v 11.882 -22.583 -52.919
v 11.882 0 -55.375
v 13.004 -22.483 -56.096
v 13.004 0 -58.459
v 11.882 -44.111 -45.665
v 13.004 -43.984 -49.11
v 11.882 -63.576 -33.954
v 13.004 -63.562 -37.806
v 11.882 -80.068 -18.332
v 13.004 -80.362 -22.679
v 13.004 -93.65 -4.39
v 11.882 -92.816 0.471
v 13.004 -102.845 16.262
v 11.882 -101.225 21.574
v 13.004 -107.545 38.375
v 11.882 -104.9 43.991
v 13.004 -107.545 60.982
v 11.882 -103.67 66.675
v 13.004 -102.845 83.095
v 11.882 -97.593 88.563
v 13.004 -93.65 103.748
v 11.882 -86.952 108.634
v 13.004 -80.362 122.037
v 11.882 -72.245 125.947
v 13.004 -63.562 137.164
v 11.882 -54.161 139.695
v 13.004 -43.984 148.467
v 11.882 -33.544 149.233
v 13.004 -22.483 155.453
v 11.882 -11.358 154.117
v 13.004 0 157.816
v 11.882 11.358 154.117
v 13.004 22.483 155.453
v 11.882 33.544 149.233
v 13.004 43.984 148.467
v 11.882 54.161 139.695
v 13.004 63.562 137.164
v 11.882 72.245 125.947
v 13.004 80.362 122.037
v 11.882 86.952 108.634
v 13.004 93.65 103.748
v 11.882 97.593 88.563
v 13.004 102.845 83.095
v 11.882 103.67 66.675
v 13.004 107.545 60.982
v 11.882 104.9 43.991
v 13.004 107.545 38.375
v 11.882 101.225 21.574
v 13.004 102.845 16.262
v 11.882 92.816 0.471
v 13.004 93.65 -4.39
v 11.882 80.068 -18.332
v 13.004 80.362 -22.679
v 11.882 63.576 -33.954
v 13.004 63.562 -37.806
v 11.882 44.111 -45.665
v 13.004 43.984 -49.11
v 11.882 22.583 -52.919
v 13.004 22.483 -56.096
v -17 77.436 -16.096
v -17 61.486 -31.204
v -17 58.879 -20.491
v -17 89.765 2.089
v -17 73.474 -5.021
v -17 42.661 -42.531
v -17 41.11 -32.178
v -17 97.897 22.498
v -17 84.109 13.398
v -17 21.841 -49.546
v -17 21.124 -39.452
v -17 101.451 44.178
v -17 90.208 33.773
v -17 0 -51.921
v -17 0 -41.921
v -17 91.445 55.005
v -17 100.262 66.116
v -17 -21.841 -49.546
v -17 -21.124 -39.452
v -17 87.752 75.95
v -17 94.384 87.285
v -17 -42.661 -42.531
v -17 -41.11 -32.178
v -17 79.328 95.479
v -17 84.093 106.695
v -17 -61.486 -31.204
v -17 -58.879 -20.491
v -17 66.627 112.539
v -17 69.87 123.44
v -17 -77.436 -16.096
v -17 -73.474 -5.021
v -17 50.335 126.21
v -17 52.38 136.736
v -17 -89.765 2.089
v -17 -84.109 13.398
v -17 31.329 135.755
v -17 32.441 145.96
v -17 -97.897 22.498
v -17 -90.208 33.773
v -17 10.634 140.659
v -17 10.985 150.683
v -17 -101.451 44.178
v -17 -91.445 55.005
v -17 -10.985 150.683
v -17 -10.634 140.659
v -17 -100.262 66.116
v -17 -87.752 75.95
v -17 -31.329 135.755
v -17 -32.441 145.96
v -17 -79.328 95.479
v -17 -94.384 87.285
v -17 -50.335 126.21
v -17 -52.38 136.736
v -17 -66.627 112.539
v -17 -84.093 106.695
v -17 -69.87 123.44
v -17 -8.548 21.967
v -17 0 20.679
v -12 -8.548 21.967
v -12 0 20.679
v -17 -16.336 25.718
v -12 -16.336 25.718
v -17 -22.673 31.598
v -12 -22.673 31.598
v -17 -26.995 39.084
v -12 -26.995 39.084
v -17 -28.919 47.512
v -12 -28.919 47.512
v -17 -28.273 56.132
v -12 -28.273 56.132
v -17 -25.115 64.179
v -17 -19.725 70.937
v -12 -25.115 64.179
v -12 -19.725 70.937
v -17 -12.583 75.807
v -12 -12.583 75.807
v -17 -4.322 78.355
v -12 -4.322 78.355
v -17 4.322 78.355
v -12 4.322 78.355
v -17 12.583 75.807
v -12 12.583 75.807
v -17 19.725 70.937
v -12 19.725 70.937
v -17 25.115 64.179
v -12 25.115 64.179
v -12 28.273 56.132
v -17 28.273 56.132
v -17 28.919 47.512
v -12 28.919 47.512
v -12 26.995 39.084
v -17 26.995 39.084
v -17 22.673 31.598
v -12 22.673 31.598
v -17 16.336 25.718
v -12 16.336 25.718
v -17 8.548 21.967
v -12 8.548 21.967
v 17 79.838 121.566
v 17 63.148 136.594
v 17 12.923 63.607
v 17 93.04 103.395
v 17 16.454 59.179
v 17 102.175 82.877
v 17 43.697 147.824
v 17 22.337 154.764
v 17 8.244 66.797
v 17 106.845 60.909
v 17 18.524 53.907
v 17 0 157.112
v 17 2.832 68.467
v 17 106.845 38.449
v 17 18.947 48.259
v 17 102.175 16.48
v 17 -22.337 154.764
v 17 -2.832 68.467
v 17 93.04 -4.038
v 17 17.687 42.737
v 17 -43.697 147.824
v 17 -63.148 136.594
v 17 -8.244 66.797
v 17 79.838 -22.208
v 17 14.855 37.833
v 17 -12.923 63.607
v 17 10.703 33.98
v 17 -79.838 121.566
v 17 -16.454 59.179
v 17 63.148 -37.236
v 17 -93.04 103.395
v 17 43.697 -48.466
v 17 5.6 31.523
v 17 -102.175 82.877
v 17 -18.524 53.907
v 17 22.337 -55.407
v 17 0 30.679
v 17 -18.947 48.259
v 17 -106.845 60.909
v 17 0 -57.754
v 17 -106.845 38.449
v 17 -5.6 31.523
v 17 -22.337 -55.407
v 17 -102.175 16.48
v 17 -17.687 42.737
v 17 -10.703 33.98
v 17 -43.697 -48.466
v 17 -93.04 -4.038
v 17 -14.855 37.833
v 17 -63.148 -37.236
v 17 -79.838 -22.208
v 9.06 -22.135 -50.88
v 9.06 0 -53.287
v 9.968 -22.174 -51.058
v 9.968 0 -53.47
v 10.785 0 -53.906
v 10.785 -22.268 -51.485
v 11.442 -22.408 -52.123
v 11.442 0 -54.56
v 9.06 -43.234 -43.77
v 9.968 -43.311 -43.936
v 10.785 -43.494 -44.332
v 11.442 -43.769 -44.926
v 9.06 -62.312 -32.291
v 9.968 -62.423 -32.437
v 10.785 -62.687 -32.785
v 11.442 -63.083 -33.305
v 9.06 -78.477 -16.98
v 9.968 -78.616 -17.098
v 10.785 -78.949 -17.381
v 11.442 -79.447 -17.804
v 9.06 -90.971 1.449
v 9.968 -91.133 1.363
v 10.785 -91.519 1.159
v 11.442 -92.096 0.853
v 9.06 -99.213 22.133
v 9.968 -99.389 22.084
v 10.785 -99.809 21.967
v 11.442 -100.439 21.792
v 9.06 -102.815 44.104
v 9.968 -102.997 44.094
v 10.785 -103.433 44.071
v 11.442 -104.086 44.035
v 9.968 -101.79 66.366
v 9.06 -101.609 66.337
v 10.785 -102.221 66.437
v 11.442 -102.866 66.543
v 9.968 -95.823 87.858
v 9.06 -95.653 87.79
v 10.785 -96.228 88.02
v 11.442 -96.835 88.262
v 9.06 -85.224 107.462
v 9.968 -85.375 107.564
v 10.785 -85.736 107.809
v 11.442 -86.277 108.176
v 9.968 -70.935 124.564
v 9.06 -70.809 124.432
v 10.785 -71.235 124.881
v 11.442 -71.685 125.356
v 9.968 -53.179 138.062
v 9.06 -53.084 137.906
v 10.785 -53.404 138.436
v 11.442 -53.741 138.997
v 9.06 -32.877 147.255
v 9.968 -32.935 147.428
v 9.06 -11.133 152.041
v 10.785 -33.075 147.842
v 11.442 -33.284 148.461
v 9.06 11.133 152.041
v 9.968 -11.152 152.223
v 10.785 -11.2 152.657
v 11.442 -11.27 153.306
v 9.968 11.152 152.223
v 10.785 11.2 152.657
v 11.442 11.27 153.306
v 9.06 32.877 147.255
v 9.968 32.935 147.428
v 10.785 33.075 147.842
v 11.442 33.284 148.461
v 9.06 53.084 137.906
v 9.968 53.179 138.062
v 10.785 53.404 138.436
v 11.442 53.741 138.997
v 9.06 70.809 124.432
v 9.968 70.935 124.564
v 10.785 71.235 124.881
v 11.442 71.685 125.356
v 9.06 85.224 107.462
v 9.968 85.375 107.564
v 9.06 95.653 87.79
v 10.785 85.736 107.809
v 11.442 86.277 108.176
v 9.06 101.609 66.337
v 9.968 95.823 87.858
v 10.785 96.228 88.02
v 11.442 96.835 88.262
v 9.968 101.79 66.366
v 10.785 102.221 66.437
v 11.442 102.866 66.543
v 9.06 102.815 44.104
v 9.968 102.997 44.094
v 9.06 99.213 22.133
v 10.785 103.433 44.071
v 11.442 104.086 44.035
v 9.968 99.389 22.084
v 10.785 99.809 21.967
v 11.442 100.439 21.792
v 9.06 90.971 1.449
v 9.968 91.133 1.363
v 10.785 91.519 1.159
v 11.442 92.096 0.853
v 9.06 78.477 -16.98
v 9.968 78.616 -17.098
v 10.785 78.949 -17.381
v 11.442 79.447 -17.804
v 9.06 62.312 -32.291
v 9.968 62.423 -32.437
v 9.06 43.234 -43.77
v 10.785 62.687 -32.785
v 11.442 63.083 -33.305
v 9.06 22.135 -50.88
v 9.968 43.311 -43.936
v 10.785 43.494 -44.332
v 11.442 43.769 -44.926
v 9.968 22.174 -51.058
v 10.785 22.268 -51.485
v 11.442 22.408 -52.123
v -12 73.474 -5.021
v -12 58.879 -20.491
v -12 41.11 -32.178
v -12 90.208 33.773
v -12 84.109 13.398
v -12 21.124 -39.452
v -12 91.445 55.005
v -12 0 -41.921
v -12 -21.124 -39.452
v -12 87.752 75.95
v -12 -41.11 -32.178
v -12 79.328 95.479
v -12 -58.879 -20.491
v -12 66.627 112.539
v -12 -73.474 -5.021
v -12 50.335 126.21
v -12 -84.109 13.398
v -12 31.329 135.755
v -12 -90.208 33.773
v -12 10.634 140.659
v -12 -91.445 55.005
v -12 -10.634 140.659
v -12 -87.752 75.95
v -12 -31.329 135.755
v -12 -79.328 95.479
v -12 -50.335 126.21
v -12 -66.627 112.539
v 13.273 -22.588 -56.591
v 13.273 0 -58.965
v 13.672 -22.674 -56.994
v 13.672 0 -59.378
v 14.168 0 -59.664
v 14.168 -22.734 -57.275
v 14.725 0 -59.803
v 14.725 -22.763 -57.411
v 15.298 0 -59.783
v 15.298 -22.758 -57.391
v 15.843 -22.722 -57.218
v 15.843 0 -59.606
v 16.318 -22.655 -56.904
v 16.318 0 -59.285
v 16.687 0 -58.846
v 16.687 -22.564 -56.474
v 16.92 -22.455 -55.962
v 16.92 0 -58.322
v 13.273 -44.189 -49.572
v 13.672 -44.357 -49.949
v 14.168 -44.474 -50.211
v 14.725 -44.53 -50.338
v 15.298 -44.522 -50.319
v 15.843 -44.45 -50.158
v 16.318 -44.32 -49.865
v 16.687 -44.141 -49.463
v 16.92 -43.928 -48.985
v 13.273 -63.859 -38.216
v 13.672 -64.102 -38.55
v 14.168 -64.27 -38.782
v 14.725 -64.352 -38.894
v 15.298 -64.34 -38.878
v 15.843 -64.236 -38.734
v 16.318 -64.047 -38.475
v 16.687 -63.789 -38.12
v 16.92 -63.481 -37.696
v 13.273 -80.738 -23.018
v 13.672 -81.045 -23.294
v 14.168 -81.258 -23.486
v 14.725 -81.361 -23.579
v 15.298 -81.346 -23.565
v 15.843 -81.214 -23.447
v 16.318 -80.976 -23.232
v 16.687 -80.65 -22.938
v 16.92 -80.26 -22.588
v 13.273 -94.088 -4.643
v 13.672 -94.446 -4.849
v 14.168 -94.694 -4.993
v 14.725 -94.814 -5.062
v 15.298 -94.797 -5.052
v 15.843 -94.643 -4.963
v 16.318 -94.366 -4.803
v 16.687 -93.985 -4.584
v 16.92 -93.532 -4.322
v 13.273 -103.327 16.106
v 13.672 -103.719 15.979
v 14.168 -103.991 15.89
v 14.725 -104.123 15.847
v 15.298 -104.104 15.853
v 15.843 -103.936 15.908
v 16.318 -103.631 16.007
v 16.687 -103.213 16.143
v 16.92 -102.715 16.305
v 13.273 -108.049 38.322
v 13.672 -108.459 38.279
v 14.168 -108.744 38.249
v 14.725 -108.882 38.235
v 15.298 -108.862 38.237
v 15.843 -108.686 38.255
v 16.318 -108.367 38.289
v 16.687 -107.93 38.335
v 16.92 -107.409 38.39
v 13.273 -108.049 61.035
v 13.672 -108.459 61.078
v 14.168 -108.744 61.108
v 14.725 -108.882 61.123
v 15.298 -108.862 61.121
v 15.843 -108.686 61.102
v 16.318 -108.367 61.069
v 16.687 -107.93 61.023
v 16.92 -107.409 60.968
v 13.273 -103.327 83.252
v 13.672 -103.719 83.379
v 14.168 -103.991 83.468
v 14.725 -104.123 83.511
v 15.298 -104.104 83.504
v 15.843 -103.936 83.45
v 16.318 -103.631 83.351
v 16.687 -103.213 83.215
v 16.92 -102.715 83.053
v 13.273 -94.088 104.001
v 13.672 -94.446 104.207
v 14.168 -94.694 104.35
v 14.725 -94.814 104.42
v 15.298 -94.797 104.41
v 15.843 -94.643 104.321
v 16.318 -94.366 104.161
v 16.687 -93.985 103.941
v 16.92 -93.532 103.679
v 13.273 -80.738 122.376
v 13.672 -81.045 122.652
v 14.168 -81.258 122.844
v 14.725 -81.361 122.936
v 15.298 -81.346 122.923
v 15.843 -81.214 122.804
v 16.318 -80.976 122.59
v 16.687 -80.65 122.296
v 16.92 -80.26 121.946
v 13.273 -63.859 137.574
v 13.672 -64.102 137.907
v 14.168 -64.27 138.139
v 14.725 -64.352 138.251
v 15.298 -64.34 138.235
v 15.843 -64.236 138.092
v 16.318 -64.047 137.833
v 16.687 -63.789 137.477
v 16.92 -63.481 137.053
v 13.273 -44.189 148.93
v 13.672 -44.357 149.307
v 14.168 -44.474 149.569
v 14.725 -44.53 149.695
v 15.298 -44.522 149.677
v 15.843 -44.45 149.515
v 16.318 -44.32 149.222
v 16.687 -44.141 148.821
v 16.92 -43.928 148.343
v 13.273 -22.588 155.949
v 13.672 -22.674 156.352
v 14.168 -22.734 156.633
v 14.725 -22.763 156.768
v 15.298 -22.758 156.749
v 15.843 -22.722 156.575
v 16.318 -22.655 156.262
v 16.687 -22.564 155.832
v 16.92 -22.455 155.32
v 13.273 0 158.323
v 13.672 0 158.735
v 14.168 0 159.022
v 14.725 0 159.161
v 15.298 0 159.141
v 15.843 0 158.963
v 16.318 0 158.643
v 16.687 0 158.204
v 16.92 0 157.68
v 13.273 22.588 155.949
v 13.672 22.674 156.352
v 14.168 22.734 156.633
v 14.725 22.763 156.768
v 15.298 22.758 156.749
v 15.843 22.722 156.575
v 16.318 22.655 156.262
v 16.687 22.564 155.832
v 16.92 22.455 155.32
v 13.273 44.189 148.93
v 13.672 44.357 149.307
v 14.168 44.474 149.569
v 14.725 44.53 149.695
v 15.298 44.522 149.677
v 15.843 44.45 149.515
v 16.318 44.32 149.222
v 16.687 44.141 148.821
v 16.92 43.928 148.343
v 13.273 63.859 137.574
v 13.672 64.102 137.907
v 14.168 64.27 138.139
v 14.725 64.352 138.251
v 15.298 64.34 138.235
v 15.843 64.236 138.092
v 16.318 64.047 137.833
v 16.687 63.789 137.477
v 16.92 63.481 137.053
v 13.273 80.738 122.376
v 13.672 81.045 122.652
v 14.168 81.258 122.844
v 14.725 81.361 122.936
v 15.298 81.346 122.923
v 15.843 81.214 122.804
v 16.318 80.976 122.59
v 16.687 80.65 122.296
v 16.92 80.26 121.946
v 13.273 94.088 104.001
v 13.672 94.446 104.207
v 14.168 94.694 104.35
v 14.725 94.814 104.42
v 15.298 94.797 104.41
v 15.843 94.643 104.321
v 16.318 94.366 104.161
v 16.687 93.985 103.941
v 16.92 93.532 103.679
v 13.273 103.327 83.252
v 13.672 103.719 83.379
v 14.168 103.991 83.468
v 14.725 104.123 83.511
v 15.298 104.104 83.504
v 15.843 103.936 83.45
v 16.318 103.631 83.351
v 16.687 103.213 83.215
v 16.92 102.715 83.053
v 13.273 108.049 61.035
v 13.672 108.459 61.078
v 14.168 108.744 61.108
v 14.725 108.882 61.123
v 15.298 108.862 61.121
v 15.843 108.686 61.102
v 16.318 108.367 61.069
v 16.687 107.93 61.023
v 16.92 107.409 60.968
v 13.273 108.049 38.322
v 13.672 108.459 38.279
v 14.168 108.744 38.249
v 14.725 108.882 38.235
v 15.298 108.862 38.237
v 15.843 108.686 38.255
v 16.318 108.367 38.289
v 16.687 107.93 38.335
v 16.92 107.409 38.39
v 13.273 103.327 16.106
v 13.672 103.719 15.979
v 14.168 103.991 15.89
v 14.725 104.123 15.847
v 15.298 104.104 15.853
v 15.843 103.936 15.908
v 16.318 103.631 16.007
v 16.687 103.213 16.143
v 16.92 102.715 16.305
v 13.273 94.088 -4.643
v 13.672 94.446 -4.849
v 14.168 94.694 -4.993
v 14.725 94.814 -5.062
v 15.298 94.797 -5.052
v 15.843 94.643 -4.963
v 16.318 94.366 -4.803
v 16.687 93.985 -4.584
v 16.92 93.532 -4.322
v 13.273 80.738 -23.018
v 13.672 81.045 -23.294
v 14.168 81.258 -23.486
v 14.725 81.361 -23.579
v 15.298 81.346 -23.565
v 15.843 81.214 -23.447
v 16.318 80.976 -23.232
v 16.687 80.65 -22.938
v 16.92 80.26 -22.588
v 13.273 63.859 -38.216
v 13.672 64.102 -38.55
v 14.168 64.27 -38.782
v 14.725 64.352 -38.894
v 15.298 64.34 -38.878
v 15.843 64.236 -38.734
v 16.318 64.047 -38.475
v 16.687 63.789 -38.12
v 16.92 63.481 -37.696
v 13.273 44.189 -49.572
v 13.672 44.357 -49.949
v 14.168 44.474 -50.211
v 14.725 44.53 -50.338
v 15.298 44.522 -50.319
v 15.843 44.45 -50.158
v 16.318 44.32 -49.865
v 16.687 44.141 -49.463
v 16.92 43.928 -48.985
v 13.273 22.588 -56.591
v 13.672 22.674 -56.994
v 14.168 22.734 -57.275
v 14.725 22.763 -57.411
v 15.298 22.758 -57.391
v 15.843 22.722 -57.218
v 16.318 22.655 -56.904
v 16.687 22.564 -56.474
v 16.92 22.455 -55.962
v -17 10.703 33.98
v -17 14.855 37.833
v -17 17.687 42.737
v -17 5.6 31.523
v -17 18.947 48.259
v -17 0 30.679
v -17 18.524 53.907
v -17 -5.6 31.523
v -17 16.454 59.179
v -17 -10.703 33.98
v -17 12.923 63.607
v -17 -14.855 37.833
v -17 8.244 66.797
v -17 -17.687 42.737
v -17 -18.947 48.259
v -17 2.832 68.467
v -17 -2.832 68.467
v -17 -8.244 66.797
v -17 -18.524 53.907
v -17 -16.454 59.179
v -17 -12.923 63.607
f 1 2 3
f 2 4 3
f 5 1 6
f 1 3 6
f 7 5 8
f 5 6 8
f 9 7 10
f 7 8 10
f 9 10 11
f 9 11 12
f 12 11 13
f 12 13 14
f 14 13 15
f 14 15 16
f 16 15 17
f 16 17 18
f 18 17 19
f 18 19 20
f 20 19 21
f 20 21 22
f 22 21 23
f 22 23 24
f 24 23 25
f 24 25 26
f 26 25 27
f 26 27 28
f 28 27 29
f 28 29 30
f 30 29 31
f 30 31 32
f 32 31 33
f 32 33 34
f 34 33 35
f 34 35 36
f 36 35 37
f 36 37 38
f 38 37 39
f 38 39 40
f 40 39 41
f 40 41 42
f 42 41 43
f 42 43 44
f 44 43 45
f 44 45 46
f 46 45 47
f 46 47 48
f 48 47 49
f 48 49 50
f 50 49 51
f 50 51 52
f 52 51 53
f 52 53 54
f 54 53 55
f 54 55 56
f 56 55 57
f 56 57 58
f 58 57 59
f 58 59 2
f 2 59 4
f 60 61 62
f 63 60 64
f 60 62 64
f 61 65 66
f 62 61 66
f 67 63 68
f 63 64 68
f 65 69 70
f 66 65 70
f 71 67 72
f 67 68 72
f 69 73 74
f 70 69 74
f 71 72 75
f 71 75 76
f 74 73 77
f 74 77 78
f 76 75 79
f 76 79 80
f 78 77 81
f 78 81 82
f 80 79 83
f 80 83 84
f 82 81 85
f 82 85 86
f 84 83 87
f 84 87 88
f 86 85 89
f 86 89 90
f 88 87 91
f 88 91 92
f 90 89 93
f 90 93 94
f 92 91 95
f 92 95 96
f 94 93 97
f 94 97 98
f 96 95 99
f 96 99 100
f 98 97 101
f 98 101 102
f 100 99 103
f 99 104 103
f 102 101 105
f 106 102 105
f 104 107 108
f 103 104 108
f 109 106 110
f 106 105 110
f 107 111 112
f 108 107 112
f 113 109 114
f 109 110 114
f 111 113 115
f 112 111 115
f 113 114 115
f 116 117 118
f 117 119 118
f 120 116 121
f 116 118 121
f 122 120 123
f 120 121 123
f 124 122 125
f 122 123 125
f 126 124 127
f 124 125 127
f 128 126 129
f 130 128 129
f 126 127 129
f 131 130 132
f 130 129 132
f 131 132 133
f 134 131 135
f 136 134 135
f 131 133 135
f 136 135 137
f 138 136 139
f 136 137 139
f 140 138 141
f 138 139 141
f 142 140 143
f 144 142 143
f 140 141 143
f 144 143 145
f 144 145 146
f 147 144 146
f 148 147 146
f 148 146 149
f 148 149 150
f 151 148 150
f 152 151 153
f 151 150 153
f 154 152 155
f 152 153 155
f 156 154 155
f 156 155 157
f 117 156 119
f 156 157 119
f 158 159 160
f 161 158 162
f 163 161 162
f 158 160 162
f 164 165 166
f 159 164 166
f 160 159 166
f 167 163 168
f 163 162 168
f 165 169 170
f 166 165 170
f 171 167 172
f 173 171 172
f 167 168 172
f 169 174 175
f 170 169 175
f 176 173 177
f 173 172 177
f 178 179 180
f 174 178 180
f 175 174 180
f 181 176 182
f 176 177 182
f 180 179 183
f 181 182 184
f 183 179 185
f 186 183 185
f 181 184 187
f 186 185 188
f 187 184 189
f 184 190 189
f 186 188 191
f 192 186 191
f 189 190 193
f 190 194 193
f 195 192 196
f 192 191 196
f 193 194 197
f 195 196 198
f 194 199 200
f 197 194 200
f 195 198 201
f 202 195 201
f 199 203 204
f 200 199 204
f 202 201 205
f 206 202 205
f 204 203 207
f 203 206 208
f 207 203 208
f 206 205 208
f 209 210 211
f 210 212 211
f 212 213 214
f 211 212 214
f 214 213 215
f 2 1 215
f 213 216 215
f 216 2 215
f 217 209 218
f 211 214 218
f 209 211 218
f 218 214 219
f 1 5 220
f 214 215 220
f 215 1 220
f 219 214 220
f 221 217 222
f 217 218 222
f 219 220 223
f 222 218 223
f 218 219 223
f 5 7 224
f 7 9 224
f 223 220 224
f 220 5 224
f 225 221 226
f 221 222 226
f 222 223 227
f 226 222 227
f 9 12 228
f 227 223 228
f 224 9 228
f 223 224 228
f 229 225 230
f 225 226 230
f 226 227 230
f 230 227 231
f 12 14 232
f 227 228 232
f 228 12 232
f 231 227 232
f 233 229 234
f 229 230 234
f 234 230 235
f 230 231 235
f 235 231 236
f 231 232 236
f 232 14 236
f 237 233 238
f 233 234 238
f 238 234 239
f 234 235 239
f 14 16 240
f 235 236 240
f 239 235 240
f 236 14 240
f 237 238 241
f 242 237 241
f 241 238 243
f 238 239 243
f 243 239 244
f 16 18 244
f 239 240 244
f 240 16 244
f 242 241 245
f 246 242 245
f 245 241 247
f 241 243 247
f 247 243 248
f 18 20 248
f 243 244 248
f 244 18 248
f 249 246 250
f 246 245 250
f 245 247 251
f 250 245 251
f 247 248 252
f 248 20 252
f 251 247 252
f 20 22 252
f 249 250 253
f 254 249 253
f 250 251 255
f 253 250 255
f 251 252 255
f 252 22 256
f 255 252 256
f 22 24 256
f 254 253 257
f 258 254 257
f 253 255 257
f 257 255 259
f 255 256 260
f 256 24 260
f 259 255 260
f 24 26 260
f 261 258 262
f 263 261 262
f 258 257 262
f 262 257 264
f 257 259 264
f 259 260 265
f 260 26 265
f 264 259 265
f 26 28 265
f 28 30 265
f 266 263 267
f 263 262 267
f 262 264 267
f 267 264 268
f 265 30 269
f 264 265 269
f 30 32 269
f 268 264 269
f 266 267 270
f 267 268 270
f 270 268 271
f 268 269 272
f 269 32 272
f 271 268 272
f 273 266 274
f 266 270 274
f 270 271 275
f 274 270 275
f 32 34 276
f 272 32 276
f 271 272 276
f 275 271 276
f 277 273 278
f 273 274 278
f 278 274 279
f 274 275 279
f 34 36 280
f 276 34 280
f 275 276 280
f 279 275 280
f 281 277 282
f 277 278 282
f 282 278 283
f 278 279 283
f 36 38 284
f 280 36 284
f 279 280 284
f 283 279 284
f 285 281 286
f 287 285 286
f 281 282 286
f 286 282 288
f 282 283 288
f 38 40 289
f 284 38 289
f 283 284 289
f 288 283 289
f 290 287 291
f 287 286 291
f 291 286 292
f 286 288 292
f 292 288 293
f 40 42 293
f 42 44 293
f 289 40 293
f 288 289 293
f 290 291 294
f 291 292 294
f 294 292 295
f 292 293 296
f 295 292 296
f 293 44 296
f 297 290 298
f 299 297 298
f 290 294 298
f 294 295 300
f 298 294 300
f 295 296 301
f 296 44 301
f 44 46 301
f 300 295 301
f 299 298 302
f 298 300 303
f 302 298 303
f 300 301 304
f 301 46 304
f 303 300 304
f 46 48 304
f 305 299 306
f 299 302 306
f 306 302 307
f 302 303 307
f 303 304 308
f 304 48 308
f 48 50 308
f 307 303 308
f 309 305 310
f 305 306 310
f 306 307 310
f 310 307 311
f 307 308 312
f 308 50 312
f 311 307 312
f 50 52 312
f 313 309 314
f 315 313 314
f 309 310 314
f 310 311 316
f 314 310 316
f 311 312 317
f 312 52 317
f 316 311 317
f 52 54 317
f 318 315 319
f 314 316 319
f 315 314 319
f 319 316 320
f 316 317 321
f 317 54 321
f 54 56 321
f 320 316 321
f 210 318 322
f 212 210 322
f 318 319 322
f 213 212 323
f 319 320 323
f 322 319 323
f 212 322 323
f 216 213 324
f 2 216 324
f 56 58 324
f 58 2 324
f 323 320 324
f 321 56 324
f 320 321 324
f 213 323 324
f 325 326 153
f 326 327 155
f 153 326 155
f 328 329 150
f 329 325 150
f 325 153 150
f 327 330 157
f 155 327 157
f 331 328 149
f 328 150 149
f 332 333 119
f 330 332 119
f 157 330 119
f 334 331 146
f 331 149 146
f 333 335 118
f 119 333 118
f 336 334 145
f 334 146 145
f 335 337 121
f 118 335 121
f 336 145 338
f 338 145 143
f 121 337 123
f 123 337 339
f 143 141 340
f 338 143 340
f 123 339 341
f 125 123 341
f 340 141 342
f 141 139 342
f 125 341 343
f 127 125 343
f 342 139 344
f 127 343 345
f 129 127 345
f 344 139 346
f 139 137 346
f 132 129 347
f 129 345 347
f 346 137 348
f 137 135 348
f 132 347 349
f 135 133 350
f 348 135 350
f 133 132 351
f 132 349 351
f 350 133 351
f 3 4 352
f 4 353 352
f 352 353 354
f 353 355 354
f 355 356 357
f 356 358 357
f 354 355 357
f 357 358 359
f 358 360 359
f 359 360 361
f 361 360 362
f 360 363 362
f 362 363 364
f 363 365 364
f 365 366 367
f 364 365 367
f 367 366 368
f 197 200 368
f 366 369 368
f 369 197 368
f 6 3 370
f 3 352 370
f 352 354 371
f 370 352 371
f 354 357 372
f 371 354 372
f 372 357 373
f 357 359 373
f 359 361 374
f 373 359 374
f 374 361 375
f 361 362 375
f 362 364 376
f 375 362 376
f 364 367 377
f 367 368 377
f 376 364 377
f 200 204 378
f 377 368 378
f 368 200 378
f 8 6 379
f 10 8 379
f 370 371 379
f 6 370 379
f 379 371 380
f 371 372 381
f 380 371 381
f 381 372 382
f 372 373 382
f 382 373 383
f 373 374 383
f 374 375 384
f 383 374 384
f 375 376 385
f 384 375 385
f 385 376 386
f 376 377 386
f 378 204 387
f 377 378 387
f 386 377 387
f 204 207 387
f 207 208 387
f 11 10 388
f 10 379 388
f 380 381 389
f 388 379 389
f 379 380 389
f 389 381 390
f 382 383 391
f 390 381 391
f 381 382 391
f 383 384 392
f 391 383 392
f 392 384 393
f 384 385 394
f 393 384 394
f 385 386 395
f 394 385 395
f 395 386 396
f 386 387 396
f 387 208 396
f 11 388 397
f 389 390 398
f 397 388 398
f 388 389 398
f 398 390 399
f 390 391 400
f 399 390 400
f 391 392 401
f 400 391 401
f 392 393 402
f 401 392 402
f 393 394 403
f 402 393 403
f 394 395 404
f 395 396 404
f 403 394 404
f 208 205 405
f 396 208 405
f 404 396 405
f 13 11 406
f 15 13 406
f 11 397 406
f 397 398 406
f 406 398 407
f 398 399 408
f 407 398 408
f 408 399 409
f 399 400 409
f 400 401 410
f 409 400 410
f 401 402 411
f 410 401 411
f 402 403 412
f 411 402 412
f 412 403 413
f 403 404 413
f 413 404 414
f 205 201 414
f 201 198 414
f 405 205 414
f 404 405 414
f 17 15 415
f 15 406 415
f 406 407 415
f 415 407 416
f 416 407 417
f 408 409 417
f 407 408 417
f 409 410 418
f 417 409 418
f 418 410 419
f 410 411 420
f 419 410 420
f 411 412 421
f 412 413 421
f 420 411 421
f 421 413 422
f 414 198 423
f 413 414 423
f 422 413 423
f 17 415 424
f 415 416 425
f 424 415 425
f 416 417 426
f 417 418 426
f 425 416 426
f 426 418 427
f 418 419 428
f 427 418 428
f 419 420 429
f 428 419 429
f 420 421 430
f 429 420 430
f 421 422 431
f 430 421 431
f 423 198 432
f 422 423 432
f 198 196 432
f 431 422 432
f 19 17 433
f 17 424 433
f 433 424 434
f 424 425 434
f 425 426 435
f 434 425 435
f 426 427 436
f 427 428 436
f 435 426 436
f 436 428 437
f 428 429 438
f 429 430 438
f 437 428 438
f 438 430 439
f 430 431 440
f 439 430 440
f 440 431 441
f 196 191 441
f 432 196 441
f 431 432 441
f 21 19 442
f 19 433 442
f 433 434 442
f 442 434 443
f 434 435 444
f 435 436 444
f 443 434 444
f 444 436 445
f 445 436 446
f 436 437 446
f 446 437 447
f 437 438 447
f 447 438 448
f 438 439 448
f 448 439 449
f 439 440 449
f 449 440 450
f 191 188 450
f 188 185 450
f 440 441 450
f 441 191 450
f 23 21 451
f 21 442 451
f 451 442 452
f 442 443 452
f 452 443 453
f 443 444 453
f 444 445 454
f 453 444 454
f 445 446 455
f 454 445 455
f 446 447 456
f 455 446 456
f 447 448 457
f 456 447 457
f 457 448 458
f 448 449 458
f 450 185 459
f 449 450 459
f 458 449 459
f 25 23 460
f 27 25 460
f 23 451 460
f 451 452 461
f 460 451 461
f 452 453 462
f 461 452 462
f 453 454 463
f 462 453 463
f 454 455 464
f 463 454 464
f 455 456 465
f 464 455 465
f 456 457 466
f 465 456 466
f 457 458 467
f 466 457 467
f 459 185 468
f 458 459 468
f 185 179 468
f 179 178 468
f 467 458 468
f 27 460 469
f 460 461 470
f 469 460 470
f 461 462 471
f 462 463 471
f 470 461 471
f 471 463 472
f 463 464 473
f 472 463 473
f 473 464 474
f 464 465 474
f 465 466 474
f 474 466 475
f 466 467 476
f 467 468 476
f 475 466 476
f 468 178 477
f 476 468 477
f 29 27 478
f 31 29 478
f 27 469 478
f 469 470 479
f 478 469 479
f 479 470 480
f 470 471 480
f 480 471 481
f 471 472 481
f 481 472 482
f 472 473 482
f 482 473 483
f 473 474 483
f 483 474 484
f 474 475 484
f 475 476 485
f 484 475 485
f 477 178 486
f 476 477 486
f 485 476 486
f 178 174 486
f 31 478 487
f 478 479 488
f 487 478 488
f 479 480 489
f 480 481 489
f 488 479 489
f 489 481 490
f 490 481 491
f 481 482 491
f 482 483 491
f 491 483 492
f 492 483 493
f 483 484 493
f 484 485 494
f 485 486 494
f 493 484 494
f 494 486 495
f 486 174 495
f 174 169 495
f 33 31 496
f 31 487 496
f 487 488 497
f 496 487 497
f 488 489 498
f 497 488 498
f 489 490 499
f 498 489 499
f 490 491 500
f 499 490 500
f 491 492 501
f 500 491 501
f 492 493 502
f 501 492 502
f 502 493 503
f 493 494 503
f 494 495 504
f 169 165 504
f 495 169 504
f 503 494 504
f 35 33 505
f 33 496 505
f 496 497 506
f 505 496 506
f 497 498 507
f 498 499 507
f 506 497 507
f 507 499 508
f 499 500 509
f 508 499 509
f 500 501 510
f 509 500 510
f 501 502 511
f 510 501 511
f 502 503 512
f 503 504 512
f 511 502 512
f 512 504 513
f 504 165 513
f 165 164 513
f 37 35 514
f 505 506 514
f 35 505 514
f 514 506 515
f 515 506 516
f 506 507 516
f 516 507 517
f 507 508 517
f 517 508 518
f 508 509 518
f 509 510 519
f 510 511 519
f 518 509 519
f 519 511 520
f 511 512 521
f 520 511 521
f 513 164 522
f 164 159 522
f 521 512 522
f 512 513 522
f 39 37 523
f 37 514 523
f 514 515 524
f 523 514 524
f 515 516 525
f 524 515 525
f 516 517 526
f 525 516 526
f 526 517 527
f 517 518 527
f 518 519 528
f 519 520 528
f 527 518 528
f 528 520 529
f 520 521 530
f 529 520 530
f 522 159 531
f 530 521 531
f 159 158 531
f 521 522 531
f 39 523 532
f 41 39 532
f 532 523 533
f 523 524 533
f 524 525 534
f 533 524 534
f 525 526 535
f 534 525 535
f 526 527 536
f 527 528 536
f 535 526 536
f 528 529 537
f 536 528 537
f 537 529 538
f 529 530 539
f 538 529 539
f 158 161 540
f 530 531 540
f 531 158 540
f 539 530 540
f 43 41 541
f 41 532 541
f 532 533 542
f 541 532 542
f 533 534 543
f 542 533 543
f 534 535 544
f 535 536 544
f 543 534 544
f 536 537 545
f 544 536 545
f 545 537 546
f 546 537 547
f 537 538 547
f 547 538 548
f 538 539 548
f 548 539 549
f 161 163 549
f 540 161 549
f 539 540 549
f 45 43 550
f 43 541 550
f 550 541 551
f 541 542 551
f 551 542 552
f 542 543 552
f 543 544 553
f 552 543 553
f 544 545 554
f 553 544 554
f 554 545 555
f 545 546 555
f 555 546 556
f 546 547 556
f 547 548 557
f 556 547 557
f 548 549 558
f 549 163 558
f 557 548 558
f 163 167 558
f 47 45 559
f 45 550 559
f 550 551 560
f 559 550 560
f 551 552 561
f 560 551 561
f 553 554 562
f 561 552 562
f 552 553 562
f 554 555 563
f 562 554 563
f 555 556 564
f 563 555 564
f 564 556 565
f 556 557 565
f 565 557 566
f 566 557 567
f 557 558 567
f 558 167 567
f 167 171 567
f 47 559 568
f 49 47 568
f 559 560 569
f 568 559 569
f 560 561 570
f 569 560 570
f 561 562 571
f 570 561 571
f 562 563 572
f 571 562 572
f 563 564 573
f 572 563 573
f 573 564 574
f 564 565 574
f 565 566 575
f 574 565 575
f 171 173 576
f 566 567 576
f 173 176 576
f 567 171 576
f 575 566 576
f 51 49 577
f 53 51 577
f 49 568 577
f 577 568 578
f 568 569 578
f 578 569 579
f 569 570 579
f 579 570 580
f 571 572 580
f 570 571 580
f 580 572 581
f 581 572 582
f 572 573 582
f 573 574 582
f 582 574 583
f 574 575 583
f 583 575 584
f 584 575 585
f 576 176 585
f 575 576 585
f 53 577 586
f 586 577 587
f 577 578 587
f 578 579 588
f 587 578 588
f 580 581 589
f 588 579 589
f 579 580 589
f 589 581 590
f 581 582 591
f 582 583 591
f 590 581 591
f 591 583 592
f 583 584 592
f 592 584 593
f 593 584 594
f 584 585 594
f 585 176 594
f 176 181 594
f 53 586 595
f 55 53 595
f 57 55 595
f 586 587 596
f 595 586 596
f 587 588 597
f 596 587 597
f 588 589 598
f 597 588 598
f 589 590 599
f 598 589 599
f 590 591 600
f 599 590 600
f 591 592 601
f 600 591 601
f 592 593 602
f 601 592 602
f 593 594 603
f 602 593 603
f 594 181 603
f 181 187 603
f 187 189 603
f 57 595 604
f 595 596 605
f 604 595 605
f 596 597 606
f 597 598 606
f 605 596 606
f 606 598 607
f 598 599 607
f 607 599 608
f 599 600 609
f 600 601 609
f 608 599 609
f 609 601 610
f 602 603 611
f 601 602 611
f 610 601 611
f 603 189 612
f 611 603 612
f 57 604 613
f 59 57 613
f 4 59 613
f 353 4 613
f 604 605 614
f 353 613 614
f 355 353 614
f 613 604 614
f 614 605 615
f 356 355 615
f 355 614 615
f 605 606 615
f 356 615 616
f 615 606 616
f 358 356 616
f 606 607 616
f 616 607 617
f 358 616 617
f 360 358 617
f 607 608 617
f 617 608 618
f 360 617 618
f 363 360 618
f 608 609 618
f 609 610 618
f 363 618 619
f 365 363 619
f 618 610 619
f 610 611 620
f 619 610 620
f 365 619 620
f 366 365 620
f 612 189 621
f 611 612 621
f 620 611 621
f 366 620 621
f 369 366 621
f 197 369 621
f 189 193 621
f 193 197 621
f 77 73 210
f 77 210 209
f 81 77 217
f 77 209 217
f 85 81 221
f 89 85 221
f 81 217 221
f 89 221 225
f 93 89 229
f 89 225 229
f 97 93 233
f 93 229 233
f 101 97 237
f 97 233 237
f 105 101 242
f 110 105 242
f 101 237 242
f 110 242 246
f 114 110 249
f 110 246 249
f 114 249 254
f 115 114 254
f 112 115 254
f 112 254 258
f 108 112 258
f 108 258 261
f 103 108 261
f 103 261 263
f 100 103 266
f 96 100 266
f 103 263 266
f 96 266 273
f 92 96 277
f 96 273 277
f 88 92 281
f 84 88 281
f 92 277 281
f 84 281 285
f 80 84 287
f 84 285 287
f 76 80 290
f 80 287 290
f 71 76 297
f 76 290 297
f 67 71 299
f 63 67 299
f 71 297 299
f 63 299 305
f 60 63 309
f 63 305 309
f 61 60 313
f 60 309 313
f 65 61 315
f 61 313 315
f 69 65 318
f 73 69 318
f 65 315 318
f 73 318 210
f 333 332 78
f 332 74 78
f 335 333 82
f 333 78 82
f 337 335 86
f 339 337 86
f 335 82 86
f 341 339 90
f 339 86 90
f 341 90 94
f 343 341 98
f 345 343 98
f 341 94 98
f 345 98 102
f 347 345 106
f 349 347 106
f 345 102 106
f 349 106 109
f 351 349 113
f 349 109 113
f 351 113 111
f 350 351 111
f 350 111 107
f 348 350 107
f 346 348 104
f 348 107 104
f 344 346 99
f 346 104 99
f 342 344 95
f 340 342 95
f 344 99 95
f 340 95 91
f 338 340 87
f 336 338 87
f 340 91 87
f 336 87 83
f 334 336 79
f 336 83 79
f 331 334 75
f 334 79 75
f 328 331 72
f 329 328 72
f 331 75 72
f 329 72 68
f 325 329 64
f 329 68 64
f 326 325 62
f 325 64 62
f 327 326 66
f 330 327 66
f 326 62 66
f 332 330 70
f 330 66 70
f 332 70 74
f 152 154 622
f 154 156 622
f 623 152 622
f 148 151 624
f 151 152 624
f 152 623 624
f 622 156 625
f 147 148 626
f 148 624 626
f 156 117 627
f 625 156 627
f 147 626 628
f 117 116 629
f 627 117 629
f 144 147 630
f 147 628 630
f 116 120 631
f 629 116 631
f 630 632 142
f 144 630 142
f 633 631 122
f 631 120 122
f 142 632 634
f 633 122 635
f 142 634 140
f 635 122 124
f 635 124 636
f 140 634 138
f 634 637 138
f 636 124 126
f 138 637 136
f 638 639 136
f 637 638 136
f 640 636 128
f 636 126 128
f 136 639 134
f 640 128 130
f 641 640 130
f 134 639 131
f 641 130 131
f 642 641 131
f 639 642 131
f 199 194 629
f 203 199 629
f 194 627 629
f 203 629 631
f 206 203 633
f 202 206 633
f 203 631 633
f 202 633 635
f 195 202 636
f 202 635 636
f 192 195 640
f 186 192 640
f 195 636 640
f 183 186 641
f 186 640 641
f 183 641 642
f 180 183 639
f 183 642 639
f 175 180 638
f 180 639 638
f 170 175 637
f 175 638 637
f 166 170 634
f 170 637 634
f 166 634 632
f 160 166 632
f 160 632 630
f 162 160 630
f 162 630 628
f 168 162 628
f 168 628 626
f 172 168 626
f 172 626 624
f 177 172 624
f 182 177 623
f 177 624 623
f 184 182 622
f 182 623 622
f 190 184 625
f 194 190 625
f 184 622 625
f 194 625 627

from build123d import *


with BuildPart() as f1:
    # F0 (on Front) → F1 (revolve)
    with BuildSketch(Plane.XZ):
        with BuildLine():
            Line((-17, -41.921168), (-17, -51.921168))
            Line((-17, -51.921168), (9.06, -53.286915))
            ThreePointArc((9.06, -53.286915), (10.785108, -53.906292), (11.881794, -55.374933))
            Line((11.881794, -55.374933), (13.004233, -58.458809))
            ThreePointArc((13.004233, -58.458809), (15.297715, -59.782951), (17, -57.754247))
            Line((17, -57.754247), (17, -51.921168))
            Line((17, -51.921168), (17, 30.678832))
            Line((17, 30.678832), (-17, 30.678832))
            Line((-17, 30.678832), (-17, 20.678832))
            Line((-17, 20.678832), (-12, 20.678832))
            Line((-12, 20.678832), (-12, -41.921168))
            Line((-12, -41.921168), (-17, -41.921168))
        make_face()
    revolve(axis=Axis((0, 0, 49.678832), (-1, 0, 0)))


solid = f1.part
